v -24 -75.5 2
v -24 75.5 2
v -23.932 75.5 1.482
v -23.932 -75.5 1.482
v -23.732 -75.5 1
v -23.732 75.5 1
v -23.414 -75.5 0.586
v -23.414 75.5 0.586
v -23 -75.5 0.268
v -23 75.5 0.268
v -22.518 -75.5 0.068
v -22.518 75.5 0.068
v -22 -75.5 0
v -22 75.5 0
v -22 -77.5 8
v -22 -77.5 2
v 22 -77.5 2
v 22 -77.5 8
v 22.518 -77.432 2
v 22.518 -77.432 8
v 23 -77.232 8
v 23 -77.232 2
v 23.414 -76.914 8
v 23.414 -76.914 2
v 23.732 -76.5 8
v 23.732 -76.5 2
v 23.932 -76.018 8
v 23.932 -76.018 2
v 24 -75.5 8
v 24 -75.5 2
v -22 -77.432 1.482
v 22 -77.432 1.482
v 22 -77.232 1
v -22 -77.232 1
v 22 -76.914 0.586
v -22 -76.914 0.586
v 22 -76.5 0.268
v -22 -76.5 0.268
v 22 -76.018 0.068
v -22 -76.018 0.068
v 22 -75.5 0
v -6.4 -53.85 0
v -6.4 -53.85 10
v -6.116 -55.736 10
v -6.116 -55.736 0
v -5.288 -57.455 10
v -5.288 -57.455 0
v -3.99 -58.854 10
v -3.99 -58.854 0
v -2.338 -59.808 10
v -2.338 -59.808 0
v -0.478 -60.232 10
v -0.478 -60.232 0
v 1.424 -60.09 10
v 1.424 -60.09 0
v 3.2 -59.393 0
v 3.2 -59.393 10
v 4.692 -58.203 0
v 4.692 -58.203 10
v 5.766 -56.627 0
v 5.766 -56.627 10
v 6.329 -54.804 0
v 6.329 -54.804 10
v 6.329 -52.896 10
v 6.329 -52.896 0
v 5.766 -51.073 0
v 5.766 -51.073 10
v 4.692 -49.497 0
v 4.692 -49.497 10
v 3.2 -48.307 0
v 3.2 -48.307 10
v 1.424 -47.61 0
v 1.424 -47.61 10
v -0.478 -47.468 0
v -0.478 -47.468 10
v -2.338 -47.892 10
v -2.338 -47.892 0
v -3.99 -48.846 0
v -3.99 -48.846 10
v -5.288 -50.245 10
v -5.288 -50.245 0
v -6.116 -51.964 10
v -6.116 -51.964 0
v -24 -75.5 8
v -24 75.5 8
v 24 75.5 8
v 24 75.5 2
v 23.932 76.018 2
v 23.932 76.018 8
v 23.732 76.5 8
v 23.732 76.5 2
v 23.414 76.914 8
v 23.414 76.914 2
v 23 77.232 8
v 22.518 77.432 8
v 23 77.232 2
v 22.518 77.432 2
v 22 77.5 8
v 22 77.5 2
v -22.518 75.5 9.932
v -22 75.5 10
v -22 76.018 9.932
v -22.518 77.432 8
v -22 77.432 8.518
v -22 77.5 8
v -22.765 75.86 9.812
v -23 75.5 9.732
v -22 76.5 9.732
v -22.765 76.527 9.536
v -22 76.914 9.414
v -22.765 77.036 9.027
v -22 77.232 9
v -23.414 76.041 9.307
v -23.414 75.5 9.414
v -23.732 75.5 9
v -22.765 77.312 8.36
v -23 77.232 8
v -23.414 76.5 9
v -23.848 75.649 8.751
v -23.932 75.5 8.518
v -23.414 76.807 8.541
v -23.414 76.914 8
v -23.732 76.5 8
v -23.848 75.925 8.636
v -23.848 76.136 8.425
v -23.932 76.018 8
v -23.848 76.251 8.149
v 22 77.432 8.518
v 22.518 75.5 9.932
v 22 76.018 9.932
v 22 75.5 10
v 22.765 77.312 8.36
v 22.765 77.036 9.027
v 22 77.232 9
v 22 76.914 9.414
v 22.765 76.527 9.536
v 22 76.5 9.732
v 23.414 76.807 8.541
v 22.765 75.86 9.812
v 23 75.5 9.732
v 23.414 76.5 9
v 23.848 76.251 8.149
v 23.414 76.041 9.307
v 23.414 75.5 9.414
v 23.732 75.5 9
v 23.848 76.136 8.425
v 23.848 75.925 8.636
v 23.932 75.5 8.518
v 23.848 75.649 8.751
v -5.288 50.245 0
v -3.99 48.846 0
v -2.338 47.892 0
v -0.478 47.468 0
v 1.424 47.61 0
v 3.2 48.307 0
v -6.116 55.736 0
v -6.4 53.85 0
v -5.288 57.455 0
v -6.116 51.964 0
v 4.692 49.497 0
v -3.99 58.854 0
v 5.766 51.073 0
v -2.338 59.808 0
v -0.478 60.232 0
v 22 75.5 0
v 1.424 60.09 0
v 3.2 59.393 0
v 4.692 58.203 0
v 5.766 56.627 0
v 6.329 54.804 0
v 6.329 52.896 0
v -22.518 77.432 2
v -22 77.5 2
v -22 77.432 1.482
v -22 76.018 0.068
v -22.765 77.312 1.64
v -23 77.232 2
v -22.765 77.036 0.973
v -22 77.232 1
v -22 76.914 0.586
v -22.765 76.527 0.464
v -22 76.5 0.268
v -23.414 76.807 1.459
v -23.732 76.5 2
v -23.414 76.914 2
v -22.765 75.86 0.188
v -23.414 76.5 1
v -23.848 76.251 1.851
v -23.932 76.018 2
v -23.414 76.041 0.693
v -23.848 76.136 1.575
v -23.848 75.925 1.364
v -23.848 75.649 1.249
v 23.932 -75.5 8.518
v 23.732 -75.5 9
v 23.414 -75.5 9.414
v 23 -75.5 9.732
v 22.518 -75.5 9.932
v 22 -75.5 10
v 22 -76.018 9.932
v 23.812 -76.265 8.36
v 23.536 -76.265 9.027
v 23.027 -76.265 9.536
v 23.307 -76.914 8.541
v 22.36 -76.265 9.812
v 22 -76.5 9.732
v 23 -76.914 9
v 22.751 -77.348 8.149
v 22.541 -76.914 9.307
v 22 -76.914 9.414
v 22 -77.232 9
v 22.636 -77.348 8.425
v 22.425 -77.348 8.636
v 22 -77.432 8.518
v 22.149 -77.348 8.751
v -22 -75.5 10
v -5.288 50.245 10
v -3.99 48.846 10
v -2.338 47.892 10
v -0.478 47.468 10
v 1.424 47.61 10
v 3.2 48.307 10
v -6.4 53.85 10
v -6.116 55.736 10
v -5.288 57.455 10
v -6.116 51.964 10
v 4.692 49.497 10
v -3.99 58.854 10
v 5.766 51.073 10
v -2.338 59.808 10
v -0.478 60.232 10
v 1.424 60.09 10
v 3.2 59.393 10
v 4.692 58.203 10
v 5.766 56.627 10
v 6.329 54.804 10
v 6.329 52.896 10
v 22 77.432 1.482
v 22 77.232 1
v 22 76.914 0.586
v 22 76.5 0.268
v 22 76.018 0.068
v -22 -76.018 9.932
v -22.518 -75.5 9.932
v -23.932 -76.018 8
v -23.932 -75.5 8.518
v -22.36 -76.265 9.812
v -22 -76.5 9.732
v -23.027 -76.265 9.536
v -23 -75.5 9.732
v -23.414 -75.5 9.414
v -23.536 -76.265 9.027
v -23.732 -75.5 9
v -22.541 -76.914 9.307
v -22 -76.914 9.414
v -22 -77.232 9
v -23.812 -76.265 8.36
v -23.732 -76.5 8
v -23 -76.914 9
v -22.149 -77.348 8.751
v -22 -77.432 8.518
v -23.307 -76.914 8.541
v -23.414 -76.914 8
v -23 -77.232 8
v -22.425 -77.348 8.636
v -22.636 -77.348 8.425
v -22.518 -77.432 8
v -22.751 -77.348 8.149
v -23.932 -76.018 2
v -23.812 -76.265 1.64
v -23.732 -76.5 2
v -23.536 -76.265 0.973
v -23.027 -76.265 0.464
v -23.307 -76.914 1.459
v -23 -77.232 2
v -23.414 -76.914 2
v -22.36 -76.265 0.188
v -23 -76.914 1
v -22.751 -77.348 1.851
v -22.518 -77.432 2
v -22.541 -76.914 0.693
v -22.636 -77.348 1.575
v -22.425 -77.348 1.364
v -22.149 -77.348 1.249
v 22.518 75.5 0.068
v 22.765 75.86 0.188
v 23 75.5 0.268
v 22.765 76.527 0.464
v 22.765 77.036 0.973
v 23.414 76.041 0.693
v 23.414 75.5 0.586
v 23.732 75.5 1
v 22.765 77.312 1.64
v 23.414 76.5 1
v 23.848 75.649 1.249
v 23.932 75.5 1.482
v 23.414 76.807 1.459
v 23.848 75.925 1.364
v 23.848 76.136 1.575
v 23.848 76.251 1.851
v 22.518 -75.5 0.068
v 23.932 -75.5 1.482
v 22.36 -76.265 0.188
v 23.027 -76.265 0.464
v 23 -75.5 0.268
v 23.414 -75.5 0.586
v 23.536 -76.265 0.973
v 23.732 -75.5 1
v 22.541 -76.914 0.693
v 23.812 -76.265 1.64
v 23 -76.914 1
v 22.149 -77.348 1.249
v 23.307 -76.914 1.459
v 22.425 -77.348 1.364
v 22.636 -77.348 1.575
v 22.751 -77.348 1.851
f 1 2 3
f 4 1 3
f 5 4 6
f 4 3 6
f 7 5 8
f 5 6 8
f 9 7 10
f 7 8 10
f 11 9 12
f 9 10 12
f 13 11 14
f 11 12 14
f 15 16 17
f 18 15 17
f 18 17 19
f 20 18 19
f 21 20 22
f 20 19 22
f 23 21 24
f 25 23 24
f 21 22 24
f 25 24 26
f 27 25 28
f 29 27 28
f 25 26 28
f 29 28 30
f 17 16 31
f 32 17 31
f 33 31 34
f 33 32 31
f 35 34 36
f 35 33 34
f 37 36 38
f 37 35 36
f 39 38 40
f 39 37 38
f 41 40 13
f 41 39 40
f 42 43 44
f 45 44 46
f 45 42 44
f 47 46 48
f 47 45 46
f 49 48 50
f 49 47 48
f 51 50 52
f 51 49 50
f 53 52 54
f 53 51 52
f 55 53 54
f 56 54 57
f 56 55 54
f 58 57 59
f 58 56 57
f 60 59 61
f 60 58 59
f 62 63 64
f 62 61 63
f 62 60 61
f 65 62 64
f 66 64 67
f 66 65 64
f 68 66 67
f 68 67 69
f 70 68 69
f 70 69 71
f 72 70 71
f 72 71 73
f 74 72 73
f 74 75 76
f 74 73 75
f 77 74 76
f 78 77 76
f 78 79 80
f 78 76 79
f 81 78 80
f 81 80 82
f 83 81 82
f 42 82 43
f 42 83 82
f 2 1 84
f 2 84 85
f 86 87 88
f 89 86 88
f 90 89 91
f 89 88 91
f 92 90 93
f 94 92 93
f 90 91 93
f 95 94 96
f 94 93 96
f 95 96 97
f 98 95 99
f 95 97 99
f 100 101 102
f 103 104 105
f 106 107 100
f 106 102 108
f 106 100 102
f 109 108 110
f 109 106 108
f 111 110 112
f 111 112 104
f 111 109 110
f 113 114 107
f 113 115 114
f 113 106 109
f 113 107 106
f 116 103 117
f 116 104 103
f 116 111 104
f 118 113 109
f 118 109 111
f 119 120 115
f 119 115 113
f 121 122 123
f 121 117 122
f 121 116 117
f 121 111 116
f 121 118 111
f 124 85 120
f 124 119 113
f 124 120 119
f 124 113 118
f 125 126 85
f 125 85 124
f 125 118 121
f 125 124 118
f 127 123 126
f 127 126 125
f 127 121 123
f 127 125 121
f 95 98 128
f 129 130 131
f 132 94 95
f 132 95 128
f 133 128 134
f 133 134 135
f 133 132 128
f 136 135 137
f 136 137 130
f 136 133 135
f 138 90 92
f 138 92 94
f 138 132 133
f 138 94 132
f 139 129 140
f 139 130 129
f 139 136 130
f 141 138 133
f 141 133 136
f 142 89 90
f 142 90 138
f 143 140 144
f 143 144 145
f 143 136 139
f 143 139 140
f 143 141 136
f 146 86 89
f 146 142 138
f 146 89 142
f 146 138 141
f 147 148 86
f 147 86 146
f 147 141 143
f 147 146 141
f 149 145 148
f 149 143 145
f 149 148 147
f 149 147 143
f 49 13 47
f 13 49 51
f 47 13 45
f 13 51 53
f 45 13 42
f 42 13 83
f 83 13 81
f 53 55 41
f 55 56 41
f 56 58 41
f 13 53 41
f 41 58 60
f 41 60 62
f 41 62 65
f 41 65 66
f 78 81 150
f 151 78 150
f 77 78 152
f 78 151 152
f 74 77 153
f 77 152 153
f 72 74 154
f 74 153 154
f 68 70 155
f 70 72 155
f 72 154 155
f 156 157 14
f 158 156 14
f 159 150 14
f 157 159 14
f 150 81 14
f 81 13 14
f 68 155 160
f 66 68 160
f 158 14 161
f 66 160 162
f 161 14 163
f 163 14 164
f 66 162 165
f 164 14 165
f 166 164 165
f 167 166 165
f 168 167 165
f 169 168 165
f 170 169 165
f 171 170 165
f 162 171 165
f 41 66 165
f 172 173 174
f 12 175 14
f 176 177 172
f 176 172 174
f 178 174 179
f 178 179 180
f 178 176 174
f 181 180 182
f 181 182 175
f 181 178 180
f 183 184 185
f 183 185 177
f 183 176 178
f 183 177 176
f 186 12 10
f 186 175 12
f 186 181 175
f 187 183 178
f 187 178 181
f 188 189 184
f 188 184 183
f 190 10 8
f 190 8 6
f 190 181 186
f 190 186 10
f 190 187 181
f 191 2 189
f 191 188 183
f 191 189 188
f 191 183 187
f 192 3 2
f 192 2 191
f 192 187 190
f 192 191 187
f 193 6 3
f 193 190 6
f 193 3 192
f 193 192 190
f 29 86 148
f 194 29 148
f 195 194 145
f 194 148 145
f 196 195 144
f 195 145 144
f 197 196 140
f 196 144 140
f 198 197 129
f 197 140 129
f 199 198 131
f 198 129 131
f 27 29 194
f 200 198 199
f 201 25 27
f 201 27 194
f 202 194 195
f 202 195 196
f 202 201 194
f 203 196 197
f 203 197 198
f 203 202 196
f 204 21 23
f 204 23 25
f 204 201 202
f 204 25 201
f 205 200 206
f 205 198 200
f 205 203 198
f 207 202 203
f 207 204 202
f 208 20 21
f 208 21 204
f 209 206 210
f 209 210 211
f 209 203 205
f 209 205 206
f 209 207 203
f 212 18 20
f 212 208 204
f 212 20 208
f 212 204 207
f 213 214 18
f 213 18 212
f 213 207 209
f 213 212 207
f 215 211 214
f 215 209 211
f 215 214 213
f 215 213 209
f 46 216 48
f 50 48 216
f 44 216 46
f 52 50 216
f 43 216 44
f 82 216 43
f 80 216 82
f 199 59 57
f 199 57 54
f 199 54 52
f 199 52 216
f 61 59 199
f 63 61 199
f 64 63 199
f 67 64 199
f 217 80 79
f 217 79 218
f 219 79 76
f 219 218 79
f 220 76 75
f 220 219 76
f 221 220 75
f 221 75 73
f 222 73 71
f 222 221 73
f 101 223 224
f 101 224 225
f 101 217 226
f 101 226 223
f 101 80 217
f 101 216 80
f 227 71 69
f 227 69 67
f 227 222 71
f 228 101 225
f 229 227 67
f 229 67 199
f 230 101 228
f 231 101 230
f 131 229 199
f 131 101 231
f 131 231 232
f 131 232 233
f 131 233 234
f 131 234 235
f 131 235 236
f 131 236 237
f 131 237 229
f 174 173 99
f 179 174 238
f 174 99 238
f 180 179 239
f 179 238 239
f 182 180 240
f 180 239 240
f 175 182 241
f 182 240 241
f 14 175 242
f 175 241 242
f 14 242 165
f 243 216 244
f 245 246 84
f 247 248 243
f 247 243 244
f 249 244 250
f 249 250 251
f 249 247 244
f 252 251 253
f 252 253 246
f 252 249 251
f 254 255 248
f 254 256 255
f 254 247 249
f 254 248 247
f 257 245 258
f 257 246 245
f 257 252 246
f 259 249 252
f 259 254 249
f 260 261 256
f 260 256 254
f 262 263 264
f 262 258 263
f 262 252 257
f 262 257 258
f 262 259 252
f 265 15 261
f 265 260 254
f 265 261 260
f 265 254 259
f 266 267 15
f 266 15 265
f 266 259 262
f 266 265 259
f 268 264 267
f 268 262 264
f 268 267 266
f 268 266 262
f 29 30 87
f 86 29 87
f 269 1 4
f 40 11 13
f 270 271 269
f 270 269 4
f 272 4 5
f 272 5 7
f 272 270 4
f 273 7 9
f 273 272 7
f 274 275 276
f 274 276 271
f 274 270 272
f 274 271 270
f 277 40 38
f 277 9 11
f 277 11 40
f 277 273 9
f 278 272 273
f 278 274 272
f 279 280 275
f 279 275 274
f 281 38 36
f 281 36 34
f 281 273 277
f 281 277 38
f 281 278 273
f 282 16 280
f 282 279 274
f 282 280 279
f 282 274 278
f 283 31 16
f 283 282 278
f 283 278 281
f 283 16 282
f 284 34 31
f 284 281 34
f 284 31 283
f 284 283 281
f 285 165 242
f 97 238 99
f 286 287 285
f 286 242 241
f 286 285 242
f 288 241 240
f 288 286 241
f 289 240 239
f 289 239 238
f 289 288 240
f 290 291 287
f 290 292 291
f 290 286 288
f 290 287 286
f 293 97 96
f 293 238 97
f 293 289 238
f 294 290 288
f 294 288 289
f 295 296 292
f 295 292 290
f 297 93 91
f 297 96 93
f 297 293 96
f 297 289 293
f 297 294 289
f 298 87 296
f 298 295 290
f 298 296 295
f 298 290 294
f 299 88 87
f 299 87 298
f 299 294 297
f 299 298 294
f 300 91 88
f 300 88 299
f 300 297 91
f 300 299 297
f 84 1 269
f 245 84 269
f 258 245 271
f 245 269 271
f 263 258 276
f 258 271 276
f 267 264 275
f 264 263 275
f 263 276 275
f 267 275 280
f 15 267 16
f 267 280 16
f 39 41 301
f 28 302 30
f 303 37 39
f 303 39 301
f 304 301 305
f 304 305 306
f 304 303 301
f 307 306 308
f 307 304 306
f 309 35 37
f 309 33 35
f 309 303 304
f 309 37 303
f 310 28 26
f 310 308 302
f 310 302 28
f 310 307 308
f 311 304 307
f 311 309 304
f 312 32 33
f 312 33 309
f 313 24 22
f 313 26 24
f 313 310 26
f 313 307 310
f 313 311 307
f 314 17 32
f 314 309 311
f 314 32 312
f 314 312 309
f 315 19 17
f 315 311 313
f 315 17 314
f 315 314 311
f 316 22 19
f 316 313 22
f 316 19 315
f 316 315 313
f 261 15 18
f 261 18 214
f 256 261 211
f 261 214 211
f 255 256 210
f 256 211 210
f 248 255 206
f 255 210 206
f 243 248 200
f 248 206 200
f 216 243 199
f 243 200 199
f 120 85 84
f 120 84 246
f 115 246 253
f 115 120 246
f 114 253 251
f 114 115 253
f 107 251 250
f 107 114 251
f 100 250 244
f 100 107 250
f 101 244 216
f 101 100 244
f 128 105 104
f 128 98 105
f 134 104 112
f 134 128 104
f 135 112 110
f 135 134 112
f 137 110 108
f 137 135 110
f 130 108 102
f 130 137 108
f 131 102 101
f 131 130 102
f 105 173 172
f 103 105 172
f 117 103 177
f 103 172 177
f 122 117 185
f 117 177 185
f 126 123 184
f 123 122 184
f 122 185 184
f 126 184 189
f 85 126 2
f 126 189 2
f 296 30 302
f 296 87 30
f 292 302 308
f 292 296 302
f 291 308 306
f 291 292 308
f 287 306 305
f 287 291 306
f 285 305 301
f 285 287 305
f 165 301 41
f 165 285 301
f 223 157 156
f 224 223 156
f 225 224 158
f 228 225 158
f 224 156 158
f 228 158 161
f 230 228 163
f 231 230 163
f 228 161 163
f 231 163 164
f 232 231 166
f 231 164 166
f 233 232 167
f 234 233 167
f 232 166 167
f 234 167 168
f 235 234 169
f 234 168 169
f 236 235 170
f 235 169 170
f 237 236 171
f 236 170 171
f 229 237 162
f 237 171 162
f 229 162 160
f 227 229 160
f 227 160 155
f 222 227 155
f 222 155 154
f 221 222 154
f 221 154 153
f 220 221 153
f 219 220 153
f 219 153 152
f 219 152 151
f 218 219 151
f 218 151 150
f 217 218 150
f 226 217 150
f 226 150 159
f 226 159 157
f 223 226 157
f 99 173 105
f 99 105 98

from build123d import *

# Parameters (mm, degrees)
SKETCH1_W           = 48
SKETCH1_H           = 155
BOSS_EXTRUDE1_DEPTH = 10
FILLET1_R           = 2
FILLET2_R           = 2
SKETCH2_R           = 6.4
CUT_EXTRUDE1_DEPTH  = 82.74503043


with BuildPart() as part:
    # Sketch1 → Boss-Extrude1 (new body)
    with BuildSketch(Plane.XY):
        Rectangle(SKETCH1_W, SKETCH1_H)
    extrude(amount=BOSS_EXTRUDE1_DEPTH)

    # Fillet1
    fillet1_edges = [part.edges().sort_by_distance(p)[0] for p in [
        (-24, 0, 10),
        (0, -77.5, 10),
        (24, 0, 10),
        (0, -77.5, 0),
        (-24, 0, 0),
        (0, 77.5, 0),
        (24, 0, 0),
        (0, 77.5, 10),
    ]]
    fillet(fillet1_edges, radius=FILLET1_R)

    # Fillet2
    # the kernel refuses this fillet: 2 mm, written as the material it takes off along each edge
    with BuildSketch(Plane(origin=(-22, 75.5, 8), x_dir=(0, 1, 0), z_dir=(-1, 0, 0))) as fillet2_piece_1_section:
        Polygon((0, 0), (FILLET2_R, 0), (FILLET2_R, -FILLET2_R), (0, -FILLET2_R), align=None)
    fillet2_piece_1 = extrude(amount=FILLET2_R, mode=Mode.PRIVATE)
    fillet2_piece_1 = fillet2_piece_1 - Plane(origin=(-22, 75.5, 8), x_dir=(0, -0.7071067811865475, -0.7071067811865475), z_dir=(-1, 0, 0)) * Sphere(FILLET2_R, mode=Mode.PRIVATE)
    add(fillet2_piece_1, mode=Mode.SUBTRACT)
    with BuildSketch(Plane(origin=(22, 75.5, 8), x_dir=(0, 1, 0), z_dir=(1, 0, 0))) as fillet2_piece_2_section:
        Polygon((0, 0), (FILLET2_R, 0), (FILLET2_R, FILLET2_R), (0, FILLET2_R), align=None)
    fillet2_piece_2 = extrude(amount=FILLET2_R, mode=Mode.PRIVATE)
    fillet2_piece_2 = fillet2_piece_2 - Plane(origin=(22, 75.5, 8), x_dir=(0, -0.7071067811865475, -0.7071067811865475), z_dir=(1, 0, 0)) * Sphere(FILLET2_R, mode=Mode.PRIVATE)
    add(fillet2_piece_2, mode=Mode.SUBTRACT)
    with BuildSketch(Plane(origin=(-22, -75.5, 8), x_dir=(-1, 0, 0), z_dir=(0, -1, 0))) as fillet2_piece_3_section:
        Polygon((0, 0), (FILLET2_R, 0), (FILLET2_R, -FILLET2_R), (0, -FILLET2_R), align=None)
    fillet2_piece_3 = extrude(amount=FILLET2_R, mode=Mode.PRIVATE)
    fillet2_piece_3 = fillet2_piece_3 - Plane(origin=(-22, -75.5, 8), x_dir=(0.7071067811865475, 0, -0.7071067811865475), z_dir=(0, -1, 0)) * Sphere(FILLET2_R, mode=Mode.PRIVATE)
    add(fillet2_piece_3, mode=Mode.SUBTRACT)
    with BuildSketch(Plane(origin=(22, -75.5, 8), x_dir=(1, 0, 0), z_dir=(0, -1, 0))) as fillet2_piece_4_section:
        Polygon((0, 0), (FILLET2_R, 0), (FILLET2_R, FILLET2_R), (0, FILLET2_R), align=None)
    fillet2_piece_4 = extrude(amount=FILLET2_R, mode=Mode.PRIVATE)
    fillet2_piece_4 = fillet2_piece_4 - Plane(origin=(22, -75.5, 8), x_dir=(-0.7071067811865475, 0, -0.7071067811865475), z_dir=(0, -1, 0)) * Sphere(FILLET2_R, mode=Mode.PRIVATE)
    add(fillet2_piece_4, mode=Mode.SUBTRACT)
    with BuildSketch(Plane(origin=(22, -75.5, 2), x_dir=(1, 0, 0), z_dir=(0, -1, 0))) as fillet2_piece_5_section:
        Polygon((0, 0), (FILLET2_R, 0), (FILLET2_R, -FILLET2_R), (0, -FILLET2_R), align=None)
    fillet2_piece_5 = extrude(amount=FILLET2_R, mode=Mode.PRIVATE)
    fillet2_piece_5 = fillet2_piece_5 - Plane(origin=(22, -75.5, 2), x_dir=(-0.7071067811865475, 0, 0.7071067811865475), z_dir=(0, -1, 0)) * Sphere(FILLET2_R, mode=Mode.PRIVATE)
    add(fillet2_piece_5, mode=Mode.SUBTRACT)
    with BuildSketch(Plane(origin=(-22, -75.5, 2), x_dir=(-1, 0, 0), z_dir=(0, -1, 0))) as fillet2_piece_6_section:
        Polygon((0, 0), (FILLET2_R, 0), (FILLET2_R, FILLET2_R), (0, FILLET2_R), align=None)
    fillet2_piece_6 = extrude(amount=FILLET2_R, mode=Mode.PRIVATE)
    fillet2_piece_6 = fillet2_piece_6 - Plane(origin=(-22, -75.5, 2), x_dir=(0.7071067811865475, 0, 0.7071067811865475), z_dir=(0, -1, 0)) * Sphere(FILLET2_R, mode=Mode.PRIVATE)
    add(fillet2_piece_6, mode=Mode.SUBTRACT)
    with BuildSketch(Plane(origin=(22, 75.5, 2), x_dir=(0, 1, 0), z_dir=(1, 0, 0))) as fillet2_piece_7_section:
        Polygon((0, 0), (FILLET2_R, 0), (FILLET2_R, -FILLET2_R), (0, -FILLET2_R), align=None)
    fillet2_piece_7 = extrude(amount=FILLET2_R, mode=Mode.PRIVATE)
    fillet2_piece_7 = fillet2_piece_7 - Plane(origin=(22, 75.5, 2), x_dir=(0, -0.7071067811865475, 0.7071067811865475), z_dir=(1, 0, 0)) * Sphere(FILLET2_R, mode=Mode.PRIVATE)
    add(fillet2_piece_7, mode=Mode.SUBTRACT)
    with BuildSketch(Plane(origin=(-22, 75.5, 2), x_dir=(0, 1, 0), z_dir=(-1, 0, 0))) as fillet2_piece_8_section:
        Polygon((0, 0), (FILLET2_R, 0), (FILLET2_R, FILLET2_R), (0, FILLET2_R), align=None)
    fillet2_piece_8 = extrude(amount=FILLET2_R, mode=Mode.PRIVATE)
    fillet2_piece_8 = fillet2_piece_8 - Plane(origin=(-22, 75.5, 2), x_dir=(0, -0.7071067811865475, 0.7071067811865475), z_dir=(-1, 0, 0)) * Sphere(FILLET2_R, mode=Mode.PRIVATE)
    add(fillet2_piece_8, mode=Mode.SUBTRACT)
    with BuildSketch(Plane(origin=(24, -77.5, 2), x_dir=(-1, 0, 0), z_dir=(0, 0, 1)), Plane(origin=(24, 77.5, 2), x_dir=(0, -1, 0), z_dir=(0, 0, 1))) as fillet2_piece_9:
        with BuildLine():
            CenterArc((FILLET2_R, -FILLET2_R), FILLET2_R, 90, 90)
            Line((0, -FILLET2_R), (0, 0))
            Line((0, 0), (FILLET2_R, 0))
        make_face()
    extrude(amount=6, mode=Mode.SUBTRACT)
    with BuildSketch(Plane(origin=(-24, -77.5, 2), x_dir=(1, 0, 0), z_dir=(0, 0, 1)), Plane(origin=(-24, 77.5, 2), x_dir=(0, -1, 0), z_dir=(0, 0, 1))) as fillet2_piece_10:
        with BuildLine():
            CenterArc((FILLET2_R, FILLET2_R), FILLET2_R, 180, 90)
            Line((0, FILLET2_R), (0, 0))
            Line((0, 0), (FILLET2_R, 0))
        make_face()
    extrude(amount=6, mode=Mode.SUBTRACT)

    # Sketch2 → Cut-Extrude1 (cut, through all)
    with BuildSketch(Plane(origin=(0, 0, 0), x_dir=(-1, 0, 0), z_dir=(0, 0, -1))):
        with Locations((0, 53.85)):
            Circle(SKETCH2_R)
    cut_extrude1 = extrude(amount=-CUT_EXTRUDE1_DEPTH, mode=Mode.SUBTRACT)

    # Mirror2: Cut-Extrude1 across plane
    add(cut_extrude1.mirror(Plane.ZX), mode=Mode.SUBTRACT)


solid = part.part
